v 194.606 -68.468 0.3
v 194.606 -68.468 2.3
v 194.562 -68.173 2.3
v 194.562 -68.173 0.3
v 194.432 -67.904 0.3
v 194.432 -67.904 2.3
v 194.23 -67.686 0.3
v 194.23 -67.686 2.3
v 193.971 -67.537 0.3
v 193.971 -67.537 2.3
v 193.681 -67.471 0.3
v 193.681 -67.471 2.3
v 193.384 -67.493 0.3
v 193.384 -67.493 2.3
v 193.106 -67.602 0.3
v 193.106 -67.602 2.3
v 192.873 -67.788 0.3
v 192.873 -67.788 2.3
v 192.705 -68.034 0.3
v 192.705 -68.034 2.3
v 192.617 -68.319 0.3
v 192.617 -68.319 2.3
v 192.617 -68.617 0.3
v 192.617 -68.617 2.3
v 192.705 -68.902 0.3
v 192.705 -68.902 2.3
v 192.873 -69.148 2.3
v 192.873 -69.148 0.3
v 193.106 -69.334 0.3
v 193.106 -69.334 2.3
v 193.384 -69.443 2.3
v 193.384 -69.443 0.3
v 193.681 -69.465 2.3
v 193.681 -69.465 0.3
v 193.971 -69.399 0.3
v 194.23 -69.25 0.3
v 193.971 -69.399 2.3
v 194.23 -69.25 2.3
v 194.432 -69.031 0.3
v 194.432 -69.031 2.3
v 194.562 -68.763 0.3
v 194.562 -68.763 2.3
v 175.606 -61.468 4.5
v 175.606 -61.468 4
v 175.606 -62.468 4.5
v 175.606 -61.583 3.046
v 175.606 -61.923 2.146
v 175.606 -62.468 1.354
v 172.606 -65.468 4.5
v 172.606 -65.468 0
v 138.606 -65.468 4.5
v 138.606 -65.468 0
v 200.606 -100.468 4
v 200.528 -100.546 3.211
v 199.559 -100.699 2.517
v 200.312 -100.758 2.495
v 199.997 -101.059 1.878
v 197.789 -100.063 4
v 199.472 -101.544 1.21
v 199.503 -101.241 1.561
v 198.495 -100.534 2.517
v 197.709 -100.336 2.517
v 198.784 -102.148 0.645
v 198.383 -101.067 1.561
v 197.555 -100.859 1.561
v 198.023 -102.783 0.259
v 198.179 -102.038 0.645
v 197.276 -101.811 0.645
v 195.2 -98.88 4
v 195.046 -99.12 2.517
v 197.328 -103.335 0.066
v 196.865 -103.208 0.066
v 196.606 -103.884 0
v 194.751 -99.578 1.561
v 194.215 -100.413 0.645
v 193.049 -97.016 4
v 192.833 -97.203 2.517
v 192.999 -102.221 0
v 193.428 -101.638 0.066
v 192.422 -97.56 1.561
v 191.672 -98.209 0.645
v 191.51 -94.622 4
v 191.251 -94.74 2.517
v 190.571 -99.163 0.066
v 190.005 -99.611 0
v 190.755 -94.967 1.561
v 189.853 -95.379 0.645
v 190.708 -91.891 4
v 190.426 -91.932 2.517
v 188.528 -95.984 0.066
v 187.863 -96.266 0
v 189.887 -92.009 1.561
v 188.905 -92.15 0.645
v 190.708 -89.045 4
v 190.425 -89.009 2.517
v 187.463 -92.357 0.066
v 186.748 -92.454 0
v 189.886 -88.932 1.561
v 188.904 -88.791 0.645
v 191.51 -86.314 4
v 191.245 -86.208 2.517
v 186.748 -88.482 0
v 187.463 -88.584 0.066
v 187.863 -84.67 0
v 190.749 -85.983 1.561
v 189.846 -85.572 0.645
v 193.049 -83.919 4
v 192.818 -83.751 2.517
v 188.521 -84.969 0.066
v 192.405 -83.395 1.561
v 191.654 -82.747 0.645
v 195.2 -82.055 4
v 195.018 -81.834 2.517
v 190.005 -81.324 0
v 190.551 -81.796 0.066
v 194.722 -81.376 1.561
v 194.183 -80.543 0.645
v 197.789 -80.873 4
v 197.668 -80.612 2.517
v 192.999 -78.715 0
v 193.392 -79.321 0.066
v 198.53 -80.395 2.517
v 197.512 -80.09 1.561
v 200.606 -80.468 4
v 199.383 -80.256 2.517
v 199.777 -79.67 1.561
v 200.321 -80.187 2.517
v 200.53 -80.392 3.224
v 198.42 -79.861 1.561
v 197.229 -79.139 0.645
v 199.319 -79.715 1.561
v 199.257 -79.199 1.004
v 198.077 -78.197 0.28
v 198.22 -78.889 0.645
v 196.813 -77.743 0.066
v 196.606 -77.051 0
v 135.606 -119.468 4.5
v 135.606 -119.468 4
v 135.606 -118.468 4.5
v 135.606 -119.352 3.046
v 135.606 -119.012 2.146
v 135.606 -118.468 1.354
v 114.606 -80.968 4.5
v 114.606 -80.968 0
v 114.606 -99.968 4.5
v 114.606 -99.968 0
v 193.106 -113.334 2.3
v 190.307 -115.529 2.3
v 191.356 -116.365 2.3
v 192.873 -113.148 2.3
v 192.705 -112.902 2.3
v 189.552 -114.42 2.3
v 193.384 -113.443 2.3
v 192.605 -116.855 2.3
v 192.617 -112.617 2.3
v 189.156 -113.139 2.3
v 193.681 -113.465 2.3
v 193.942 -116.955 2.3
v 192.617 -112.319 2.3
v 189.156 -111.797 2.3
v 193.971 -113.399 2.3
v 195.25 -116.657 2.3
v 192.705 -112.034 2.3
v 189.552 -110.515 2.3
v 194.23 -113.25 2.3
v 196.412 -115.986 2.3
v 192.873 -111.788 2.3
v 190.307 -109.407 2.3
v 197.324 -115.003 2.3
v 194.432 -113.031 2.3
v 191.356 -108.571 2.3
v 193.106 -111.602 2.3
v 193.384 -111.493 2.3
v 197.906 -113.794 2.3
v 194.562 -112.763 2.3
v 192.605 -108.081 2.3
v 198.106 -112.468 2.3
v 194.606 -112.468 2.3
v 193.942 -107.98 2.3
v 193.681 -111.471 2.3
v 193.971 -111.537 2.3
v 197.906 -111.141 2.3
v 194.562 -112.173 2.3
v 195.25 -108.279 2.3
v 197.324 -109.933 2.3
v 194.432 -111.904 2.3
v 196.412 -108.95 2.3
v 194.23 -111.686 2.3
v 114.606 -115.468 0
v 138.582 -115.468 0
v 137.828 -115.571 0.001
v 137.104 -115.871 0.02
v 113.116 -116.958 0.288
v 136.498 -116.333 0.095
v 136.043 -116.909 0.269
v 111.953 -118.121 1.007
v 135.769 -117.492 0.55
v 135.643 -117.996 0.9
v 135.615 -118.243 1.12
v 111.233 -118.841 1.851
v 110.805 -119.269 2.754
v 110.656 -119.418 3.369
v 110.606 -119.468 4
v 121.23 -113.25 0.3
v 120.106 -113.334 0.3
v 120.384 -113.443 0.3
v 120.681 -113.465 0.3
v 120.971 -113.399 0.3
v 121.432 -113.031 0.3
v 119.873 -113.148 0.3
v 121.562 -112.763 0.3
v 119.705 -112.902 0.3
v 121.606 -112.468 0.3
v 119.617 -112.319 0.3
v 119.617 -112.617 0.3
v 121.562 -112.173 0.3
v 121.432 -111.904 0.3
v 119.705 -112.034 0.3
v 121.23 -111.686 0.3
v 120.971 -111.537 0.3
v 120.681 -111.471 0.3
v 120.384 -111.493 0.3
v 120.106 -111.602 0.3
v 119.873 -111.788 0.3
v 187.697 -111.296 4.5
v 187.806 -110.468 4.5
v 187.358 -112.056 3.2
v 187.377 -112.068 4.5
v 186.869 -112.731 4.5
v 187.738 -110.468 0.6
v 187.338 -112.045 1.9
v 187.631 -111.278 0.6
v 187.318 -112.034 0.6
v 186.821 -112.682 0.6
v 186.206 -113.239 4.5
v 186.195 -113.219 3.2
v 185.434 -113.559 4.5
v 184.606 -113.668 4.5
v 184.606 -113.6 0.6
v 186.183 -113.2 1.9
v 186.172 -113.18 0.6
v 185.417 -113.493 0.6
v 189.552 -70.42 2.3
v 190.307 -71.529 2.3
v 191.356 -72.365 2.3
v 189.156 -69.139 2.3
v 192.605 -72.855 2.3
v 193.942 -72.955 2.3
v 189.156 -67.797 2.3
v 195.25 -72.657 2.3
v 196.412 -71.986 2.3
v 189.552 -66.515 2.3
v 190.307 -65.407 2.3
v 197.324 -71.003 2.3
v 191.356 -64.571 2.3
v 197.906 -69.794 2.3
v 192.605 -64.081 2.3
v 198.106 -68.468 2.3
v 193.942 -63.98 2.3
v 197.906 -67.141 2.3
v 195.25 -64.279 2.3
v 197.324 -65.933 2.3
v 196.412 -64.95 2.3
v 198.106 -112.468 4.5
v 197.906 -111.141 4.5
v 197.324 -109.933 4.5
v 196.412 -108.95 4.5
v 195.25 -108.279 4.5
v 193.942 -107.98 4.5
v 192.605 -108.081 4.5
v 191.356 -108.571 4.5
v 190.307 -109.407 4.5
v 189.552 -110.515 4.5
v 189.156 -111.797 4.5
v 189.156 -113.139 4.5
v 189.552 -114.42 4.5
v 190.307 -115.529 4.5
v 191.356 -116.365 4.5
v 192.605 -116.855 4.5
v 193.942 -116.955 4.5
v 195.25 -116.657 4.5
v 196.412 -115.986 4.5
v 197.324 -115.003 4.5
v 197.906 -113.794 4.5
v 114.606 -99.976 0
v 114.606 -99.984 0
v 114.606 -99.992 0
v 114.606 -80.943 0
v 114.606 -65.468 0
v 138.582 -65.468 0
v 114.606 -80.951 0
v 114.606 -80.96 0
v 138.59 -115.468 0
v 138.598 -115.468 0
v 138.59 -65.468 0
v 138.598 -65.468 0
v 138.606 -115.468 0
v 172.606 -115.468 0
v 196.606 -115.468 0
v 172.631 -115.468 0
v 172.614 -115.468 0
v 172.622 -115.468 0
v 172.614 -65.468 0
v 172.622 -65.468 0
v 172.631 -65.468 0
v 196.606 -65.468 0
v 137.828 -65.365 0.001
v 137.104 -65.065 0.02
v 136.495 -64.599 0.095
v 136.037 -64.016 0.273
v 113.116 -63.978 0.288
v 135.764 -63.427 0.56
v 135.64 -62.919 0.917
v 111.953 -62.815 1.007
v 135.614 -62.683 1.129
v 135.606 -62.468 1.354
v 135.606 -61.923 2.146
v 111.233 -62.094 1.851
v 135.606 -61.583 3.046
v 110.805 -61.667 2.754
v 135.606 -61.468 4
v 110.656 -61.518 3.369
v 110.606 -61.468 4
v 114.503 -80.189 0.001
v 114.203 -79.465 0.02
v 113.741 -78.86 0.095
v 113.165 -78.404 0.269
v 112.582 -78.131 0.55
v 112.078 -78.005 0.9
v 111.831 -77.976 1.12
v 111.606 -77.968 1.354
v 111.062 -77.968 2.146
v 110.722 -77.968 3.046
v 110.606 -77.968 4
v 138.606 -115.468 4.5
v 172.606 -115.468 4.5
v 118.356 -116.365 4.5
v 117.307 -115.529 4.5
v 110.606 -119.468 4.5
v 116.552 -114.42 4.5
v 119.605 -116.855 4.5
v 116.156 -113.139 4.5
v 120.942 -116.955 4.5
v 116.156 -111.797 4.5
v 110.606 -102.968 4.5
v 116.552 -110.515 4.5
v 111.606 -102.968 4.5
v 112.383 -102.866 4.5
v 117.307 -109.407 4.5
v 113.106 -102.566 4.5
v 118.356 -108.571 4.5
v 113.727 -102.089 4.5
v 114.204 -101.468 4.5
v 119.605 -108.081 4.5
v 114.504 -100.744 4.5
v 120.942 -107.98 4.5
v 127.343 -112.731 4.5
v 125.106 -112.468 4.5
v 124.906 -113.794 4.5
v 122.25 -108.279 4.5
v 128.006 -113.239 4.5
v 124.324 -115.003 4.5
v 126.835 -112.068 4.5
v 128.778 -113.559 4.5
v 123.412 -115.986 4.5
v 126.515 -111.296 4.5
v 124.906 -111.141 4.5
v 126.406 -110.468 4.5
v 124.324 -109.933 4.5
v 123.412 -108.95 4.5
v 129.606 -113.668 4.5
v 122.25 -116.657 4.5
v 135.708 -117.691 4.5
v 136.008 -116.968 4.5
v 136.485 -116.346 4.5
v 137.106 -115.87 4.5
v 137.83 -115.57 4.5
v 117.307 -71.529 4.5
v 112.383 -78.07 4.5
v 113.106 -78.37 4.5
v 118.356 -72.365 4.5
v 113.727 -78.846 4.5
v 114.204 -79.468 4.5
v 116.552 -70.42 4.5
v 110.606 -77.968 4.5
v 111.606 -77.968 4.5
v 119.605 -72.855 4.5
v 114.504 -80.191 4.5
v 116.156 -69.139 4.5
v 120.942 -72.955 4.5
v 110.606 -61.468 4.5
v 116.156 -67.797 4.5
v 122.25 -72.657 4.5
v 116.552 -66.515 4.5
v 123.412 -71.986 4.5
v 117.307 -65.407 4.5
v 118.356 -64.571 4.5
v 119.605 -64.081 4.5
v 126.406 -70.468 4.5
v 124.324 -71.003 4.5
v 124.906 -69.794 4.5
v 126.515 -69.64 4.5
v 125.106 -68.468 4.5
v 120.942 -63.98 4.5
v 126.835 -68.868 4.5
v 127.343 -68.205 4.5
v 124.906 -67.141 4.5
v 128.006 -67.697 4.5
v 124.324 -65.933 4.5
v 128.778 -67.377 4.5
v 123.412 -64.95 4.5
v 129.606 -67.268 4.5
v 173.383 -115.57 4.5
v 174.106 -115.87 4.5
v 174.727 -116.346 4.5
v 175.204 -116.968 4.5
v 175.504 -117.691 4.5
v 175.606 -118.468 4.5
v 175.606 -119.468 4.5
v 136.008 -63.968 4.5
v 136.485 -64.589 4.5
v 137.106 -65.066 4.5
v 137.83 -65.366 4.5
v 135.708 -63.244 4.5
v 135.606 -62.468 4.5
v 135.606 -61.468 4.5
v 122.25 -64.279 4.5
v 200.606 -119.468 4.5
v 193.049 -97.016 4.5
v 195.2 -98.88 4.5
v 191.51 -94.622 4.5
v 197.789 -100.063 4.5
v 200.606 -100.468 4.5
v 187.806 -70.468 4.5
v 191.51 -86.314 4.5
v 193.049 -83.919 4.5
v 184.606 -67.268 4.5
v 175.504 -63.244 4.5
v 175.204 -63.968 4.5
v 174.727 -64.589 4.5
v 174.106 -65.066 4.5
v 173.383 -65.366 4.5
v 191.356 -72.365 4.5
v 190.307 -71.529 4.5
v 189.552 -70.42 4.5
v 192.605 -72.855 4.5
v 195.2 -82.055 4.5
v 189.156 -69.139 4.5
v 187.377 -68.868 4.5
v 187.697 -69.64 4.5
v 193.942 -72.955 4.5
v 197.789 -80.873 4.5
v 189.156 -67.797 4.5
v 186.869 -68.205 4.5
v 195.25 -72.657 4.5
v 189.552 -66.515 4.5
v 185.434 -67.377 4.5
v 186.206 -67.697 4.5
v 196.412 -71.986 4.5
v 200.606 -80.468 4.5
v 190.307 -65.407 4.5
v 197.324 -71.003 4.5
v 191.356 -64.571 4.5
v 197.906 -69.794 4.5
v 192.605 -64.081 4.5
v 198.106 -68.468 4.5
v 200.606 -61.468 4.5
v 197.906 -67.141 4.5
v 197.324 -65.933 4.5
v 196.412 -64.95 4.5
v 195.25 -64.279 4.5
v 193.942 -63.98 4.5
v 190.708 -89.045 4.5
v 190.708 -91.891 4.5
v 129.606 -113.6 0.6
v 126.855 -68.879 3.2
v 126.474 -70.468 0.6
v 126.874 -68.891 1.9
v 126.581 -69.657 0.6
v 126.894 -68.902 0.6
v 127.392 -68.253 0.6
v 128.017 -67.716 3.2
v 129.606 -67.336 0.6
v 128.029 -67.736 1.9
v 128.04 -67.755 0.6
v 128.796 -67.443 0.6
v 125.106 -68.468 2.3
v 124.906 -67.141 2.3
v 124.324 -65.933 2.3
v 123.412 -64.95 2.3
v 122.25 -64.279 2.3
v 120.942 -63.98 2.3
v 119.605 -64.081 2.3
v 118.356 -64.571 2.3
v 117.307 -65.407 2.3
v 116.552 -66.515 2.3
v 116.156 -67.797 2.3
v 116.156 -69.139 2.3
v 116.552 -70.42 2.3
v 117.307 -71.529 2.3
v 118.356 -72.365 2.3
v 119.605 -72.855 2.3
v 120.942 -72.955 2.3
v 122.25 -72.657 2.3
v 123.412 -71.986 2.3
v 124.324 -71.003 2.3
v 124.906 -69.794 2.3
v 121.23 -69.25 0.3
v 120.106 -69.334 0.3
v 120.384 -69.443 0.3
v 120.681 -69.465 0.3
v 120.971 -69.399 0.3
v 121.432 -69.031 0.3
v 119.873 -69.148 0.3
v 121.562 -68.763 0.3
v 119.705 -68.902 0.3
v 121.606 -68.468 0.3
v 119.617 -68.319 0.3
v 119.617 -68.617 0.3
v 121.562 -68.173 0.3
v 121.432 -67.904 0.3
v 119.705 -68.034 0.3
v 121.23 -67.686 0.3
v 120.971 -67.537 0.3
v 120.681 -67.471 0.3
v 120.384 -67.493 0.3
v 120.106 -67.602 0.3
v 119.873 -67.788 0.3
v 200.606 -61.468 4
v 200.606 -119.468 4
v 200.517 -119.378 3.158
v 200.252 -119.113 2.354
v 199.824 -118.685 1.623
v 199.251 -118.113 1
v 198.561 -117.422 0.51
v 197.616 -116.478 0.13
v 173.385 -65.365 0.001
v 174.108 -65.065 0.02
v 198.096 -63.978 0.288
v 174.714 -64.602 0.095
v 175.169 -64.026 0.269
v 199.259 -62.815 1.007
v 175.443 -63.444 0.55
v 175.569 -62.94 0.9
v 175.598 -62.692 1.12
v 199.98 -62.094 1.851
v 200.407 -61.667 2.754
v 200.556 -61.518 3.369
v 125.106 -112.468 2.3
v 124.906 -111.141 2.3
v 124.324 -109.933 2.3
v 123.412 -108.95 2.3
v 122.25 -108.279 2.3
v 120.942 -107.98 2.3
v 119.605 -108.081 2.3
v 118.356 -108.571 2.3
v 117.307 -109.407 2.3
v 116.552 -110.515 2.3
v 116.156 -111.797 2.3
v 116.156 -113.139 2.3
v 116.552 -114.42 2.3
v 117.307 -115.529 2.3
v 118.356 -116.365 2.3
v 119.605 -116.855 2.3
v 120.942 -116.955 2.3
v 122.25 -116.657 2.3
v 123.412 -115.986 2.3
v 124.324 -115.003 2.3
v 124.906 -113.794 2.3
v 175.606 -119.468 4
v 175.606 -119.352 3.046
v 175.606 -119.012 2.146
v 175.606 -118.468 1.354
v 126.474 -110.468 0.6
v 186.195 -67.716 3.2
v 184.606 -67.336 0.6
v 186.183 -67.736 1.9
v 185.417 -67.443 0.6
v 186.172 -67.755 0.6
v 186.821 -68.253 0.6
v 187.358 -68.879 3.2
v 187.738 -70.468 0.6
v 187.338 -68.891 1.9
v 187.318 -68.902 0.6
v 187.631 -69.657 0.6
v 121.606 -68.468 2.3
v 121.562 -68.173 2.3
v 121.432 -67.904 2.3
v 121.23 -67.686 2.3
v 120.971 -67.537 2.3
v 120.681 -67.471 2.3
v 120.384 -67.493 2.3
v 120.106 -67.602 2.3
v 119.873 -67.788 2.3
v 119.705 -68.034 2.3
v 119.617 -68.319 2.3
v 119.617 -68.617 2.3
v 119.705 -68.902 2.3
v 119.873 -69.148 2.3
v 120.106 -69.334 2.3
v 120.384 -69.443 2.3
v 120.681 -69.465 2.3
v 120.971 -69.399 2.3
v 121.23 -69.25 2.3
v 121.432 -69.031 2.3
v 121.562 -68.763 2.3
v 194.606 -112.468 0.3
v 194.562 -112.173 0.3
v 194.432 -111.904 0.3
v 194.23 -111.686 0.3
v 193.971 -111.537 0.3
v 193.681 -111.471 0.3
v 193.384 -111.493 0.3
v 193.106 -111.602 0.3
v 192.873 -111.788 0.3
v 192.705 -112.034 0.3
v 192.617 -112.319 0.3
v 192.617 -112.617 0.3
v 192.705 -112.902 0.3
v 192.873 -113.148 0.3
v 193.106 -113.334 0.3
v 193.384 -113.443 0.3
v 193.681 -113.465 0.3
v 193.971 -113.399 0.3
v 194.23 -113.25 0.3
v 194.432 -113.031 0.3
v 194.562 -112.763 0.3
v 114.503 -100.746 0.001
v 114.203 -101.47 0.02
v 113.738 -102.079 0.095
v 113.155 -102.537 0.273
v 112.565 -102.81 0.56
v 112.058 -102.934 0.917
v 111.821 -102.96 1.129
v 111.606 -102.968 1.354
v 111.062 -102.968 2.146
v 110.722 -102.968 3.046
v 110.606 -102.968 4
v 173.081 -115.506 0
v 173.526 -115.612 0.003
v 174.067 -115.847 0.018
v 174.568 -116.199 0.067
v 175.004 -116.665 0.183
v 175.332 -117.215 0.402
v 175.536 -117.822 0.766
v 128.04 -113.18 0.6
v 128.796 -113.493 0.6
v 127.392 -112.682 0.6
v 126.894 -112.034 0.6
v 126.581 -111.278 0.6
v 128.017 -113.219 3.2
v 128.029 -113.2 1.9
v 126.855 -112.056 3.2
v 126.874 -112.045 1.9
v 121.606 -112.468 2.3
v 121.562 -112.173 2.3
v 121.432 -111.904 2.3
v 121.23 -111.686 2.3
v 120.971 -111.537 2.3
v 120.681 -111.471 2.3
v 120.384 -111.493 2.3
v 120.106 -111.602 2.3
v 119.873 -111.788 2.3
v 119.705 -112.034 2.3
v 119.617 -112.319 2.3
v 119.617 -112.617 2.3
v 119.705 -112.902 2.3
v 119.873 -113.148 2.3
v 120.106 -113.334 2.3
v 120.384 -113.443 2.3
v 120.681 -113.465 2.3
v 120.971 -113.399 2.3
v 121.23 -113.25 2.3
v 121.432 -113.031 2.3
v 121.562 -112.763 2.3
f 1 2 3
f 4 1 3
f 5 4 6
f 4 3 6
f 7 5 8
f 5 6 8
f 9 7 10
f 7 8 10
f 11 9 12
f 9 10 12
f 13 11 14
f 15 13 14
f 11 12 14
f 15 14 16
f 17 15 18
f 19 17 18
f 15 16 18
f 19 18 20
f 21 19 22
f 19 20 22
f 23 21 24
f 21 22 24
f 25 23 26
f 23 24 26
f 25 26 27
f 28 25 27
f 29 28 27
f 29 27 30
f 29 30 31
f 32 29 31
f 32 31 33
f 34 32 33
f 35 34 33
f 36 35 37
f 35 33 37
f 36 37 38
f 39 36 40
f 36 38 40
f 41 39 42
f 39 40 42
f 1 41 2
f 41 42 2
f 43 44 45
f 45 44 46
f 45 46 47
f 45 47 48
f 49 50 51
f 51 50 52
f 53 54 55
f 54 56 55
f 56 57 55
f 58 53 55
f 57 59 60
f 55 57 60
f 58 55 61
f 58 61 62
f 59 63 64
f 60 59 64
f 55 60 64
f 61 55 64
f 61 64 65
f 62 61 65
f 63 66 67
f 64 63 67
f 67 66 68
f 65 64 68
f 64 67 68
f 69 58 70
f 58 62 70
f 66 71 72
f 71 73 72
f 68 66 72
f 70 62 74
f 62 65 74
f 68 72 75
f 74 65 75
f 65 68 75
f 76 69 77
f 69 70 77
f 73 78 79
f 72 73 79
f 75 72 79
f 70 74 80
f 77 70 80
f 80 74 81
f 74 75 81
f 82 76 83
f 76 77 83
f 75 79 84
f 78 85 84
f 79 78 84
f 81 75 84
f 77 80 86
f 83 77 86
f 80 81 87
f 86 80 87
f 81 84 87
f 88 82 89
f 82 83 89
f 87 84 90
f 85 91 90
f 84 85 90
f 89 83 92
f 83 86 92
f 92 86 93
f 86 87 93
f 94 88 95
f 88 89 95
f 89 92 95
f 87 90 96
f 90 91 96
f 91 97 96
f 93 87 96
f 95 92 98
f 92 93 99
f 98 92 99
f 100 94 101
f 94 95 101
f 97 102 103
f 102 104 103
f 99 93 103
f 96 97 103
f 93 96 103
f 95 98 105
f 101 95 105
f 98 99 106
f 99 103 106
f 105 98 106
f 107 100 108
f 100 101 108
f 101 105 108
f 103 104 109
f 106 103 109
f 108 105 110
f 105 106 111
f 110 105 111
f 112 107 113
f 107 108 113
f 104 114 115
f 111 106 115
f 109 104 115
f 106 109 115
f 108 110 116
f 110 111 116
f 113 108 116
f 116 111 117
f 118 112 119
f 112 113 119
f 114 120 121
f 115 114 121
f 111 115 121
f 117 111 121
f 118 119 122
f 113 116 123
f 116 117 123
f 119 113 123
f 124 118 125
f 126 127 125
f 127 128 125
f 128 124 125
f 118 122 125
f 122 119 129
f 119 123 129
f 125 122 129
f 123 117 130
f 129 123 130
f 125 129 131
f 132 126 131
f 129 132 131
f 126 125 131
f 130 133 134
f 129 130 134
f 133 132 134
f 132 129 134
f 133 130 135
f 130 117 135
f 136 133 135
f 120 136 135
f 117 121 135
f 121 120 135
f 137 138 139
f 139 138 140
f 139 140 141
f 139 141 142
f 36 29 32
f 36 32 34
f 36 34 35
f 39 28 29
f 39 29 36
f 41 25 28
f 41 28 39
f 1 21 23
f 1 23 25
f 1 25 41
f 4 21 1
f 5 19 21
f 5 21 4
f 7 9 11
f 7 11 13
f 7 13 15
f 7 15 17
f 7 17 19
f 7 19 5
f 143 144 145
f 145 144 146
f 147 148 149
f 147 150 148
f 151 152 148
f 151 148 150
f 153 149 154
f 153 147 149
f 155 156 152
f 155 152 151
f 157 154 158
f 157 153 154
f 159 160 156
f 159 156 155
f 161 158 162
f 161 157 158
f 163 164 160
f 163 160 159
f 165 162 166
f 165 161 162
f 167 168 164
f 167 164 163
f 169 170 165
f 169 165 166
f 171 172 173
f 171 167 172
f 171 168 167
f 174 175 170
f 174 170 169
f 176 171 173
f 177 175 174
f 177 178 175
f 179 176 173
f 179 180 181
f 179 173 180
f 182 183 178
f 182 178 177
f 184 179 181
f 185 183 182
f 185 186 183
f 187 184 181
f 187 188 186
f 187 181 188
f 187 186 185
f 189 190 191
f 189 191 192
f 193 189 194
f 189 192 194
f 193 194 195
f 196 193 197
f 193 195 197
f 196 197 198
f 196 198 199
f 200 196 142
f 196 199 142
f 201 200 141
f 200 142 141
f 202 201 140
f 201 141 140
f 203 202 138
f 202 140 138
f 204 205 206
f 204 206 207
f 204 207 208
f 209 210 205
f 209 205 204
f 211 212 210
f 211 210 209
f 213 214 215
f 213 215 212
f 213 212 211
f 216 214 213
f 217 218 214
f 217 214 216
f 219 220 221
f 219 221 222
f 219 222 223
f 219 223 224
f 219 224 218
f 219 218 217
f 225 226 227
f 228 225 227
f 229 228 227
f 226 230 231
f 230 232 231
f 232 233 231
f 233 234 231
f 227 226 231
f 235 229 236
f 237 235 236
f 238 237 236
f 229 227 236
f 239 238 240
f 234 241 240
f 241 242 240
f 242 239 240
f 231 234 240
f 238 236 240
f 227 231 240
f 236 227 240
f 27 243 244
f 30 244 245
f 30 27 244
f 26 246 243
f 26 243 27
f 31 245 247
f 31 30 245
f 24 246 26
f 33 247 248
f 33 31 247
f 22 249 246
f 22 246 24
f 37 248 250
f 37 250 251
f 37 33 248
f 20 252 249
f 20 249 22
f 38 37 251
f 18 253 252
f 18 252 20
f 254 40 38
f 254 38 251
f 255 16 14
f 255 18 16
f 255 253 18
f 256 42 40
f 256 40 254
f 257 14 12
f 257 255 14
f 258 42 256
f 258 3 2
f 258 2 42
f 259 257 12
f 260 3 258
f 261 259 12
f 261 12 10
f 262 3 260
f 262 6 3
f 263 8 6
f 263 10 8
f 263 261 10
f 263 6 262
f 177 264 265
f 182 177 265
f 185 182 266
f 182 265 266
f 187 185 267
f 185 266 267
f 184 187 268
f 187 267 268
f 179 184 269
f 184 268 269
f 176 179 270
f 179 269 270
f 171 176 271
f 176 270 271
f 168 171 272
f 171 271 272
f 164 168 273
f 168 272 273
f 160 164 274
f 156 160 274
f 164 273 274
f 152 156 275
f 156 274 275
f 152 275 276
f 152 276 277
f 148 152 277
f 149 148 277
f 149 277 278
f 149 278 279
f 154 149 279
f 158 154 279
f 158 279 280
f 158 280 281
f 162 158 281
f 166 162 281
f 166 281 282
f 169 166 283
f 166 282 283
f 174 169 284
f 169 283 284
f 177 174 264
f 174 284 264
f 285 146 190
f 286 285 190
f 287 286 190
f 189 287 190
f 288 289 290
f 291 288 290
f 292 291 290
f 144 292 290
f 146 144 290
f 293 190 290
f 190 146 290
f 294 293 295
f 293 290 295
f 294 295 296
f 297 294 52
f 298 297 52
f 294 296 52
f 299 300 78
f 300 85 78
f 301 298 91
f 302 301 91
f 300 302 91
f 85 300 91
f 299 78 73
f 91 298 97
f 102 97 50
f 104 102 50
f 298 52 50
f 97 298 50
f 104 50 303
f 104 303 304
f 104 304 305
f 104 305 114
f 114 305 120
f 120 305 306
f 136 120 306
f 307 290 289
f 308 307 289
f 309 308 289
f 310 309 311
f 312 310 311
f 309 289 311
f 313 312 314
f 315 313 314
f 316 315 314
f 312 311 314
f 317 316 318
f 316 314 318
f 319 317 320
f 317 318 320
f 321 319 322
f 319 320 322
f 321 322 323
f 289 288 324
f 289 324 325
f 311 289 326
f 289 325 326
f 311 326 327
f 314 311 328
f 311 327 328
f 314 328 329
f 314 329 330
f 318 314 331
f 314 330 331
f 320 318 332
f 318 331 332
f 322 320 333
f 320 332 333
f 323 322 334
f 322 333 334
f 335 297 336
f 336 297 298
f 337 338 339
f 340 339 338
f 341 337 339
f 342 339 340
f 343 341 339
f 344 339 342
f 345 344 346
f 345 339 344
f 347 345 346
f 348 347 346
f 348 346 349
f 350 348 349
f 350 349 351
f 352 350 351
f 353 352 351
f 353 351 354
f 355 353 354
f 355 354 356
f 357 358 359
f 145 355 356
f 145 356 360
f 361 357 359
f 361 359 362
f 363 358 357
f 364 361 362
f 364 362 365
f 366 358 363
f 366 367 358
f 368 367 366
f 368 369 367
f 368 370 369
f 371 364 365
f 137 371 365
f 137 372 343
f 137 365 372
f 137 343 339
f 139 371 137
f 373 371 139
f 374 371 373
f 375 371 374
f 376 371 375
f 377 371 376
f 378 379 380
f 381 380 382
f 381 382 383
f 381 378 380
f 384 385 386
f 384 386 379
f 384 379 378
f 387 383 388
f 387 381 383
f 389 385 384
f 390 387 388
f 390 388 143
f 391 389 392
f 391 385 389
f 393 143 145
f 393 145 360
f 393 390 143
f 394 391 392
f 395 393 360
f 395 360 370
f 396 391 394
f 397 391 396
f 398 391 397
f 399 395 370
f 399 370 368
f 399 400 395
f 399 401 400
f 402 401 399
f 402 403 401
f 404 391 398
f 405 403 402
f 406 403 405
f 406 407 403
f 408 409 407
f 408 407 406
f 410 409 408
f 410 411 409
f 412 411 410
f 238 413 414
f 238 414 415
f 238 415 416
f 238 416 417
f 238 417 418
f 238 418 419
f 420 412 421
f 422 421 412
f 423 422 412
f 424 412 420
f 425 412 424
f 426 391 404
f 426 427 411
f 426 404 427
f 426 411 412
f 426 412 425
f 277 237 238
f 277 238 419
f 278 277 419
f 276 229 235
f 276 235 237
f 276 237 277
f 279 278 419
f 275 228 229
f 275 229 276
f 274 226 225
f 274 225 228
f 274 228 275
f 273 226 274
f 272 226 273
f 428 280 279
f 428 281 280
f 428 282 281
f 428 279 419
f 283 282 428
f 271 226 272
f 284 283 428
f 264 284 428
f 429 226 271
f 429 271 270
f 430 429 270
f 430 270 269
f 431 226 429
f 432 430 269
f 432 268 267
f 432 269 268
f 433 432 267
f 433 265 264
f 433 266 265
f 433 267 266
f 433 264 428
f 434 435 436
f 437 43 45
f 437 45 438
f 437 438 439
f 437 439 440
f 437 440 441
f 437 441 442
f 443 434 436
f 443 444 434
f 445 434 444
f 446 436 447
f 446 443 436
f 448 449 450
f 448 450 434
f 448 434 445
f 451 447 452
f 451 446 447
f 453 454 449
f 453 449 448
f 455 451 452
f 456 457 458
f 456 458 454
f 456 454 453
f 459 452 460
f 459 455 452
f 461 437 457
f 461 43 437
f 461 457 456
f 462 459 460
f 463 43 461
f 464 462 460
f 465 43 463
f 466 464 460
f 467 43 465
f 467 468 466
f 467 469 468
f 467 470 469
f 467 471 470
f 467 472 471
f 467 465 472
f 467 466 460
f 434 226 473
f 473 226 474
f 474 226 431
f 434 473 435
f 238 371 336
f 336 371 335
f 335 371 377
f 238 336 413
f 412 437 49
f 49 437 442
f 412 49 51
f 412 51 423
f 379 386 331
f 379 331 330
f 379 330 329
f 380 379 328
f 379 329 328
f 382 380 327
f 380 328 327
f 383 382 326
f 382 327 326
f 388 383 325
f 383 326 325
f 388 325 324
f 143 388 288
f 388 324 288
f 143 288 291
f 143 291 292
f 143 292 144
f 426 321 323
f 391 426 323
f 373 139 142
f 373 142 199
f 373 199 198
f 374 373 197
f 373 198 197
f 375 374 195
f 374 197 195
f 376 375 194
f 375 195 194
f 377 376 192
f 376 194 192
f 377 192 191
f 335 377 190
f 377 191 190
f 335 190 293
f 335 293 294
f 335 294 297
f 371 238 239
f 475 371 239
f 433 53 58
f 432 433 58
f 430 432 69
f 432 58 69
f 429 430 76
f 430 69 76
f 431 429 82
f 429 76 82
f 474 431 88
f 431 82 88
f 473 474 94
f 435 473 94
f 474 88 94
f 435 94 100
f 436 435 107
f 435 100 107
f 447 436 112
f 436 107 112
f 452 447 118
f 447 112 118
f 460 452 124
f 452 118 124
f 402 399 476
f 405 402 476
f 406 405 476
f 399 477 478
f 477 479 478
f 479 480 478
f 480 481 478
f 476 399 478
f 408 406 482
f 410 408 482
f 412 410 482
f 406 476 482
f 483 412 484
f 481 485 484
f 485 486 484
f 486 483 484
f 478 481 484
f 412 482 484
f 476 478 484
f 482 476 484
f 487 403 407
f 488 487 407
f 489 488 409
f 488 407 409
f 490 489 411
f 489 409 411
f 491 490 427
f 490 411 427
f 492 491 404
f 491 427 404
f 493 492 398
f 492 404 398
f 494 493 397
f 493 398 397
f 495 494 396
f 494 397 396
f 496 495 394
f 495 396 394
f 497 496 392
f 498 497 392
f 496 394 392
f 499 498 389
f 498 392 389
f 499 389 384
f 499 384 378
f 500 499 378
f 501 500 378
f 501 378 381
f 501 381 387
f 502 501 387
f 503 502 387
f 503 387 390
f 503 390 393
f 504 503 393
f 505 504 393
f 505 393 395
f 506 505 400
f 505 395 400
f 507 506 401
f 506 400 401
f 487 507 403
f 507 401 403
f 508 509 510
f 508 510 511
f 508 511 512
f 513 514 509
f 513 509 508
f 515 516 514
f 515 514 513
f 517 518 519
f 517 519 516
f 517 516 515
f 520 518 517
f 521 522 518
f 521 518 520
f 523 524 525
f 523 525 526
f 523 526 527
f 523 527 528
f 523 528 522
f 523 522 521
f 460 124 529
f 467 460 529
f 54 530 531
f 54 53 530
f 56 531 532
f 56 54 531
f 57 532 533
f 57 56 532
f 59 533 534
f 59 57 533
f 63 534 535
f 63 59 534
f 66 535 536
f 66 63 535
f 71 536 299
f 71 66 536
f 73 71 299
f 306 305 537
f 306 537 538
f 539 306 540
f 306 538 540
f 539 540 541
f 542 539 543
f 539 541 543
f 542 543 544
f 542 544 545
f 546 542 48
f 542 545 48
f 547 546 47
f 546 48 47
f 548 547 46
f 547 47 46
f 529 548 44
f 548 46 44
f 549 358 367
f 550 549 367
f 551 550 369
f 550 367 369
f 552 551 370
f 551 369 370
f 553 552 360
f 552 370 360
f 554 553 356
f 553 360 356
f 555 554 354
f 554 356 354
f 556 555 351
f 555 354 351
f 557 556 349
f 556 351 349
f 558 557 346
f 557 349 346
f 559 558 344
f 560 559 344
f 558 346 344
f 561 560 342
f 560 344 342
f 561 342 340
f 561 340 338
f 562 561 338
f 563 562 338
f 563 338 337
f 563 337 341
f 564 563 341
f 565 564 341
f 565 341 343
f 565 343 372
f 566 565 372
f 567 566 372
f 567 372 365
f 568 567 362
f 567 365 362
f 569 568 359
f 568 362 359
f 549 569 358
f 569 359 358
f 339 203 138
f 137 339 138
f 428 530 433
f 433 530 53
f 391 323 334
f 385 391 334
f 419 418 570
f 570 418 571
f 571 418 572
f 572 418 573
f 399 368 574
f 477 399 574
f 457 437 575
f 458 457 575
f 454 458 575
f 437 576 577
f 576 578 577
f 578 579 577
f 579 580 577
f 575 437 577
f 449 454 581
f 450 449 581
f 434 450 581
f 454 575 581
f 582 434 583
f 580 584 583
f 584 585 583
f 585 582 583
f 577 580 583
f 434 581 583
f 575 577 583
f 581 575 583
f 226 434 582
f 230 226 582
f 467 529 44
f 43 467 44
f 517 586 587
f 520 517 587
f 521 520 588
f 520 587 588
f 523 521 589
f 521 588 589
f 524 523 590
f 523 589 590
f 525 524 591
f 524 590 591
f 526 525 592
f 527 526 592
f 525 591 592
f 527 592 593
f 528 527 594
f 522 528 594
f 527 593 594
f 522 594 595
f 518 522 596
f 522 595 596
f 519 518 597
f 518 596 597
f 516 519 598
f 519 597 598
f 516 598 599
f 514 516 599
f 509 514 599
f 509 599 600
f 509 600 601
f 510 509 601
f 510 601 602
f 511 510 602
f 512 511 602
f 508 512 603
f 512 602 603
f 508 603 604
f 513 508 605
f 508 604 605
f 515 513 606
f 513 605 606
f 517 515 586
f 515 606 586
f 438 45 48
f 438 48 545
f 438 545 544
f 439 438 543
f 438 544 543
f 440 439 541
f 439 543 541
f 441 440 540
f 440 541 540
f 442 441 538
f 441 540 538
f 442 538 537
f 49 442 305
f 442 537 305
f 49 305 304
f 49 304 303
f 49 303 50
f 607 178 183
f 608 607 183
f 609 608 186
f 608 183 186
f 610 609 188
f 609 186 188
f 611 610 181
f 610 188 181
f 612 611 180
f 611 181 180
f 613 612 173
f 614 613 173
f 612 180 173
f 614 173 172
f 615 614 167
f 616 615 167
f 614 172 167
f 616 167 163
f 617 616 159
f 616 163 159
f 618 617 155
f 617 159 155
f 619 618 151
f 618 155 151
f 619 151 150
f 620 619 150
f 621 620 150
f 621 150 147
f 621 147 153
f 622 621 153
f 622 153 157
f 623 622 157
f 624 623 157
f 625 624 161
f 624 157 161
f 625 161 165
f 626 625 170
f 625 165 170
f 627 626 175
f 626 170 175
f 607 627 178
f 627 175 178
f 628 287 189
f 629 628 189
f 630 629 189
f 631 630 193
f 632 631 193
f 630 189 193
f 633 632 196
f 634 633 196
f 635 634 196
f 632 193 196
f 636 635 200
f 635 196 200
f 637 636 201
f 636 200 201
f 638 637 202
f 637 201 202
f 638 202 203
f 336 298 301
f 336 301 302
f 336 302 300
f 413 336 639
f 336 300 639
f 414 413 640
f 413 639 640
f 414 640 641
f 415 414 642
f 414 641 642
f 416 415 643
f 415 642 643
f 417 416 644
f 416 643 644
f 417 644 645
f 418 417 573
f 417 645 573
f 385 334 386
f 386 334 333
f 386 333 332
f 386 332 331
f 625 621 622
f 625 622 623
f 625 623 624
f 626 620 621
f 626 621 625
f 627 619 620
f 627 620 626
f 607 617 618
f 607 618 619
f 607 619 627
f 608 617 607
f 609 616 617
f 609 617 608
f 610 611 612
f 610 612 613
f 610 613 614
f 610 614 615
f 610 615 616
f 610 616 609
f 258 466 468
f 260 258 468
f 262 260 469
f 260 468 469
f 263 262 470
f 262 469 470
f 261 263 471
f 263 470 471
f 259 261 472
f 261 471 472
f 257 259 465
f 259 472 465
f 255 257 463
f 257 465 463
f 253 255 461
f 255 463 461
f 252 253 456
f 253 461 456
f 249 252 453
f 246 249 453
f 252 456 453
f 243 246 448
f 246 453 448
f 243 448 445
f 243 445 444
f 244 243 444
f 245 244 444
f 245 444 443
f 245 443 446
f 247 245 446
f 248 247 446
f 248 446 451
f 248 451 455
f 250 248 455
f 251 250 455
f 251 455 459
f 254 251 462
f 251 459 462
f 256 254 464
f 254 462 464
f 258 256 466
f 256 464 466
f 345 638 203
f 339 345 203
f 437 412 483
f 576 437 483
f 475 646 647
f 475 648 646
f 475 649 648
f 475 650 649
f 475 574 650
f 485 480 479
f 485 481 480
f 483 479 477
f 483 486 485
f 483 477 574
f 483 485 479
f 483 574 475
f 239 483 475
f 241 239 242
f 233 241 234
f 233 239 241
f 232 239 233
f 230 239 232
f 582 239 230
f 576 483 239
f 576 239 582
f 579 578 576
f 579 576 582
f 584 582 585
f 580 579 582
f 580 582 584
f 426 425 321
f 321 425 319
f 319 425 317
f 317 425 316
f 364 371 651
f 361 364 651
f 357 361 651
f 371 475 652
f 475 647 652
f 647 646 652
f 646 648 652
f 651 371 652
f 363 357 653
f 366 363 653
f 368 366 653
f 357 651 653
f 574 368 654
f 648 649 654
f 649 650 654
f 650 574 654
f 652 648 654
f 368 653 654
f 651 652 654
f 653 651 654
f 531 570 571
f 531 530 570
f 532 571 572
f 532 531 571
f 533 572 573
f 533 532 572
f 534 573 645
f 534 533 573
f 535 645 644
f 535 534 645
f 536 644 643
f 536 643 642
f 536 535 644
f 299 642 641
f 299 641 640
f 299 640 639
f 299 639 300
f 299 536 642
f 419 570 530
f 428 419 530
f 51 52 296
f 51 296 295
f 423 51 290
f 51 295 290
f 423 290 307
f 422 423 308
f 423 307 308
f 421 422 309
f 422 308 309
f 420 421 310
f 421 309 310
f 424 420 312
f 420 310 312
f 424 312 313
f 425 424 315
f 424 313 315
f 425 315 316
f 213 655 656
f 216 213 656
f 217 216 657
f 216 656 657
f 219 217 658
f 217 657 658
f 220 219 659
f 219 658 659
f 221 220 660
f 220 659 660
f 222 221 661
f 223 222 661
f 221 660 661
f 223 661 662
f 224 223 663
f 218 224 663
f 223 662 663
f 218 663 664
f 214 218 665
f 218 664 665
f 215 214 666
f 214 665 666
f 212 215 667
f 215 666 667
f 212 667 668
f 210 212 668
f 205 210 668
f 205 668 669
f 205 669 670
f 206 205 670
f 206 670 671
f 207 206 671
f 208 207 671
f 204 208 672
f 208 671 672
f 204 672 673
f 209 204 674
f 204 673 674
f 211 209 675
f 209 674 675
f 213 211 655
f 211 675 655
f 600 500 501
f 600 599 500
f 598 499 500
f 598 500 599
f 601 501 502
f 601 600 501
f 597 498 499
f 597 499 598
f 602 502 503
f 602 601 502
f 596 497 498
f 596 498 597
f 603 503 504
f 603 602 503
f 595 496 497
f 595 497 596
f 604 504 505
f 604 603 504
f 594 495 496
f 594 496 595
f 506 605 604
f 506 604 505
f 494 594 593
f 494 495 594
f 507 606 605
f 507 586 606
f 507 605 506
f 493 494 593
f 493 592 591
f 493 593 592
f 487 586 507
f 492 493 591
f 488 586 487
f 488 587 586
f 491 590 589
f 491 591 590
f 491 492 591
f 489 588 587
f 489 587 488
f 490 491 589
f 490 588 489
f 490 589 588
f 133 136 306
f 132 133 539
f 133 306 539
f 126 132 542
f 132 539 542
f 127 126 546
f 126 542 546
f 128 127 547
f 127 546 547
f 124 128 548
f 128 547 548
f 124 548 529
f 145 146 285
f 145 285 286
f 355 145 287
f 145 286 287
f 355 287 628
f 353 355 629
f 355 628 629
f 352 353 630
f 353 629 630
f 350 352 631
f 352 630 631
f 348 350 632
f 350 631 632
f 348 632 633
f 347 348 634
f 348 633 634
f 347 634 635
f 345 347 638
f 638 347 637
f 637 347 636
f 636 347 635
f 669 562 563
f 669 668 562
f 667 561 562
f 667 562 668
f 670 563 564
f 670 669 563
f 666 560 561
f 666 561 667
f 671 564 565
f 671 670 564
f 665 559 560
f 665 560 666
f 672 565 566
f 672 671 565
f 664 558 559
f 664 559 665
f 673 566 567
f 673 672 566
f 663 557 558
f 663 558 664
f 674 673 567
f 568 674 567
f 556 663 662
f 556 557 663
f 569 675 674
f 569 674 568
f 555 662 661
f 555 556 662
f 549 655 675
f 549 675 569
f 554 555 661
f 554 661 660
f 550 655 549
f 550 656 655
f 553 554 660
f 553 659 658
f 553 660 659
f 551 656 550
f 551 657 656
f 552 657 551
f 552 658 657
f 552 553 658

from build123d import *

# Parameters (mm, degrees)
Y_KSEKLIK_EKSTR_ZYON1_DEPTH = 4.5
KES_EKSTR_ZYON2_DEPTH       = 3.9
IZIM7_R                     = 4.5
KES_EKSTR_ZYON3_DEPTH       = 2.2
IZIM9_R                     = 1
KES_EKSTR_ZYON4_DEPTH       = 2
RADYUS4_R                   = 4
PAH1_SIZE                   = 0.2
PAH1_SIZE_2                 = 11.457992326


# Some blends are built 0.0001 mm under size
with BuildPart() as part:
    # Çizim4 → Yükseklik-Ekstrüzyon1 (new body)
    with BuildSketch(Plane.XY):
        with BuildLine():
            Line((200.606144994, -119.46781712), (200.606144994, -100.46781712))
            ThreePointArc((200.606144994, -100.46781712), (190.606144994, -90.46781712), (200.606144994, -80.46781712))
            Line((200.606144994, -80.46781712), (200.606144994, -61.46781712))
            Line((200.606144994, -61.46781712), (175.606144994, -61.46781712))
            Line((175.606144994, -61.46781712), (175.606144994, -62.46781712))
            ThreePointArc((175.606144994, -62.46781712), (174.727465338, -64.589137464), (172.606144994, -65.46781712))
            Line((172.606144994, -65.46781712), (138.606144994, -65.46781712))
            ThreePointArc((138.606144994, -65.46781712), (136.484824651, -64.589137464), (135.606144994, -62.46781712))
            Line((135.606144994, -62.46781712), (135.606144994, -61.46781712))
            Line((135.606144994, -61.46781712), (110.606144994, -61.46781712))
            Line((110.606144994, -61.46781712), (110.606144994, -77.96781712))
            Line((110.606144994, -77.96781712), (111.606144994, -77.96781712))
            ThreePointArc((111.606144994, -77.96781712), (113.727465338, -78.846496777), (114.606144994, -80.96781712))
            Line((114.606144994, -80.96781712), (114.606144994, -99.96781712))
            ThreePointArc((114.606144994, -99.96781712), (113.727465338, -102.089137464), (111.606144994, -102.96781712))
            Line((111.606144994, -102.96781712), (110.606144994, -102.96781712))
            Line((110.606144994, -102.96781712), (110.606144994, -119.46781712))
            Line((110.606144994, -119.46781712), (135.606144994, -119.46781712))
            Line((135.606144994, -119.46781712), (135.606144994, -118.46781712))
            ThreePointArc((135.606144994, -118.46781712), (136.484824651, -116.346496777), (138.606144994, -115.46781712))
            Line((138.606144994, -115.46781712), (172.606144994, -115.46781712))
            ThreePointArc((172.606144994, -115.46781712), (174.727465338, -116.346496777), (175.606144994, -118.46781712))
            Line((175.606144994, -118.46781712), (175.606144994, -119.46781712))
            Line((175.606144994, -119.46781712), (200.606144994, -119.46781712))
        make_face()
    extrude(amount=Y_KSEKLIK_EKSTR_ZYON1_DEPTH)

    # Çizim6 → Kes-Ekstrüzyon2 (cut)
    with BuildSketch(Plane.XY.offset(4.5)):
        with BuildLine():
            Line((129.606144994, -67.46781712), (184.606144994, -67.46781712))
            ThreePointArc((184.606144994, -67.46781712), (186.727465338, -68.346496777), (187.606144994, -70.46781712))
            Line((187.606144994, -70.46781712), (187.606144994, -110.46781712))
            ThreePointArc((187.606144994, -110.46781712), (186.727465338, -112.589137464), (184.606144994, -113.46781712))
            Line((184.606144994, -113.46781712), (129.606144994, -113.46781712))
            ThreePointArc((129.606144994, -113.46781712), (127.484824651, -112.589137464), (126.606144994, -110.46781712))
            Line((126.606144994, -110.46781712), (126.606144994, -70.46781712))
            ThreePointArc((126.606144994, -70.46781712), (127.484824651, -68.346496777), (129.606144994, -67.46781712))
        make_face()
    extrude(amount=-KES_EKSTR_ZYON2_DEPTH, mode=Mode.SUBTRACT)

    # Çizim7 → Kes-Ekstrüzyon3 (cut)
    with BuildSketch(Plane.XY.offset(4.5)):
        with Locations((193.606144994, -68.46781712)):
            Circle(IZIM7_R)
        with Locations((193.606144994, -112.46781712)):
            Circle(IZIM7_R)
        with Locations((120.606144994, -68.46781712)):
            Circle(IZIM7_R)
        with Locations((120.606144994, -112.46781712)):
            Circle(IZIM7_R)
    extrude(amount=-KES_EKSTR_ZYON3_DEPTH, mode=Mode.SUBTRACT)

    # Çizim9 → Kes-Ekstrüzyon4 (cut)
    with BuildSketch(Plane.XY.offset(2.3)):
        with Locations((193.606144994, -68.46781712)):
            Circle(IZIM9_R)
        with Locations((193.606144994, -112.46781712)):
            Circle(IZIM9_R)
        with Locations((120.606144994, -68.46781712)):
            Circle(IZIM9_R)
        with Locations((120.606144994, -112.46781712)):
            Circle(IZIM9_R)
    extrude(amount=-KES_EKSTR_ZYON4_DEPTH, mode=Mode.SUBTRACT)

    # Radyus4
    radyus4_edges = [part.edges().sort_by_distance(p)[0] for p in [
        (123.106144994, -61.46781712, 0),
        (110.606144994, -111.21781712, 0),
        (123.106144994, -119.46781712, 0),
        (188.106144994, -119.46781712, 0),
        (188.106144994, -61.46781712, 0),
        (110.606144994, -69.71781712, 0),
        (200.606144994, -70.96781712, 0),
        (190.606144994, -90.46781712, 0),
        (200.606144994, -109.96781712, 0),
    ]]
    fillet(radyus4_edges, radius=RADYUS4_R - 0.0001)  # a hair under: the kernel refuses the full size

    # Pah1
    # the kernel refuses this chamfer: 11.457992326, 0.2 mm, written as the material it takes off along each edge
    with BuildSketch(Plane(origin=(184.606144994, -70.46781712, 4.5), x_dir=(0, 1, 0), z_dir=(-1, 0, 0))) as pah1_piece_1_section:
        Polygon((3 + PAH1_SIZE, 0), (3, PAH1_SIZE_2), (3, 0), align=None)
    pah1_piece_1 = revolve(axis=Axis((184.606144994, -70.46781712, 4.5), (0, 0, -1)), revolution_arc=90, mode=Mode.PRIVATE)
    pah1_piece_1 = split(pah1_piece_1, bisect_by=Plane(origin=(184.990398639, -67.399868147, 0.6), z_dir=(0, 0, 1)), keep=Keep.TOP, mode=Mode.PRIVATE)
    add(pah1_piece_1, mode=Mode.SUBTRACT)
    with BuildSketch(Plane(origin=(187.606144994, -70.46781712, 4.5), x_dir=(0.41331439412646753, 0, 0.9105883875867686), z_dir=(0, -1, 0))) as pah1_piece_2_section:
        Polygon((PAH1_SIZE * 0.413314394126, -PAH1_SIZE * 0.910588387587), (-PAH1_SIZE_2 * 0.910588387599, -PAH1_SIZE_2 * 0.413314394132), (0, 0), align=None)
    pah1_piece_2 = extrude(amount=40, mode=Mode.PRIVATE)
    pah1_piece_2 = split(pah1_piece_2, bisect_by=Plane(origin=(187.689115858, -74.555184991, 0.6), z_dir=(0, 0, 1)), keep=Keep.TOP, mode=Mode.PRIVATE)
    add(pah1_piece_2, mode=Mode.SUBTRACT)
    with BuildSketch(Plane(origin=(184.606144994, -110.46781712, 4.5), x_dir=(1, 0, 0), z_dir=(0, 1, 0))) as pah1_piece_3_section:
        Polygon((3 + PAH1_SIZE, 0), (3, PAH1_SIZE_2), (3, 0), align=None)
    pah1_piece_3 = revolve(axis=Axis((184.606144994, -110.46781712, 4.5), (0, 0, -1)), revolution_arc=90, mode=Mode.PRIVATE)
    pah1_piece_3 = split(pah1_piece_3, bisect_by=Plane(origin=(187.674093967, -110.852070765, 0.6), z_dir=(0, 0, 1)), keep=Keep.TOP, mode=Mode.PRIVATE)
    add(pah1_piece_3, mode=Mode.SUBTRACT)
    with BuildSketch(Plane(origin=(184.606144994, -113.46781712, 4.5), x_dir=(0, -0.41331439412651433, 0.9105883875867473), z_dir=(-1, 0, 0))) as pah1_piece_4_section:
        Polygon((PAH1_SIZE * 0.413314394127, -PAH1_SIZE * 0.910588387587), (-PAH1_SIZE_2 * 0.910588387599, -PAH1_SIZE_2 * 0.413314394132), (0, 0), align=None)
    pah1_piece_4 = extrude(amount=55, mode=Mode.PRIVATE)
    pah1_piece_4 = split(pah1_piece_4, bisect_by=Plane(origin=(157.106144994, -113.55196189, 0.6), z_dir=(0, 0, 1)), keep=Keep.TOP, mode=Mode.PRIVATE)
    add(pah1_piece_4, mode=Mode.SUBTRACT)
    with BuildSketch(Plane(origin=(129.606144994, -110.46781712, 4.5), x_dir=(0, -1, 0), z_dir=(1, 0, 0))) as pah1_piece_5_section:
        Polygon((3 + PAH1_SIZE, 0), (3, PAH1_SIZE_2), (3, 0), align=None)
    pah1_piece_5 = revolve(axis=Axis((129.606144994, -110.46781712, 4.5), (0, 0, -1)), revolution_arc=90, mode=Mode.PRIVATE)
    pah1_piece_5 = split(pah1_piece_5, bisect_by=Plane(origin=(129.22189135, -113.535766093, 0.6), z_dir=(0, 0, 1)), keep=Keep.TOP, mode=Mode.PRIVATE)
    add(pah1_piece_5, mode=Mode.SUBTRACT)
    with BuildSketch(Plane(origin=(126.606144994, -110.46781712, 4.5), x_dir=(-0.41331439412651433, 0, 0.9105883875867473), z_dir=(0, 1, 0))) as pah1_piece_6_section:
        Polygon((PAH1_SIZE * 0.413314394127, -PAH1_SIZE * 0.910588387587), (-PAH1_SIZE_2 * 0.910588387599, -PAH1_SIZE_2 * 0.413314394132), (0, 0), align=None)
    pah1_piece_6 = extrude(amount=40, mode=Mode.PRIVATE)
    pah1_piece_6 = split(pah1_piece_6, bisect_by=Plane(origin=(126.522000225, -90.46781712, 0.6), z_dir=(0, 0, 1)), keep=Keep.TOP, mode=Mode.PRIVATE)
    add(pah1_piece_6, mode=Mode.SUBTRACT)
    with BuildSketch(Plane(origin=(129.606144994, -70.46781712, 4.5), x_dir=(-1, 0, 0), z_dir=(0, -1, 0))) as pah1_piece_7_section:
        Polygon((3 + PAH1_SIZE, 0), (3, PAH1_SIZE_2), (3, 0), align=None)
    pah1_piece_7 = revolve(axis=Axis((129.606144994, -70.46781712, 4.5), (0, 0, -1)), revolution_arc=90, mode=Mode.PRIVATE)
    pah1_piece_7 = split(pah1_piece_7, bisect_by=Plane(origin=(126.538196021, -70.083563476, 0.6), z_dir=(0, 0, 1)), keep=Keep.TOP, mode=Mode.PRIVATE)
    add(pah1_piece_7, mode=Mode.SUBTRACT)
    with BuildSketch(Plane(origin=(129.606144994, -67.46781712, 4.5), x_dir=(0, 0.41331439412651433, 0.9105883875867473), z_dir=(1, 0, 0))) as pah1_piece_8_section:
        Polygon((PAH1_SIZE * 0.413314394127, -PAH1_SIZE * 0.910588387587), (-PAH1_SIZE_2 * 0.910588387599, -PAH1_SIZE_2 * 0.413314394132), (0, 0), align=None)
    pah1_piece_8 = extrude(amount=55, mode=Mode.PRIVATE)
    pah1_piece_8 = split(pah1_piece_8, bisect_by=Plane(origin=(157.106144994, -67.383672351, 0.6), z_dir=(0, 0, 1)), keep=Keep.TOP, mode=Mode.PRIVATE)
    add(pah1_piece_8, mode=Mode.SUBTRACT)


solid = part.part
